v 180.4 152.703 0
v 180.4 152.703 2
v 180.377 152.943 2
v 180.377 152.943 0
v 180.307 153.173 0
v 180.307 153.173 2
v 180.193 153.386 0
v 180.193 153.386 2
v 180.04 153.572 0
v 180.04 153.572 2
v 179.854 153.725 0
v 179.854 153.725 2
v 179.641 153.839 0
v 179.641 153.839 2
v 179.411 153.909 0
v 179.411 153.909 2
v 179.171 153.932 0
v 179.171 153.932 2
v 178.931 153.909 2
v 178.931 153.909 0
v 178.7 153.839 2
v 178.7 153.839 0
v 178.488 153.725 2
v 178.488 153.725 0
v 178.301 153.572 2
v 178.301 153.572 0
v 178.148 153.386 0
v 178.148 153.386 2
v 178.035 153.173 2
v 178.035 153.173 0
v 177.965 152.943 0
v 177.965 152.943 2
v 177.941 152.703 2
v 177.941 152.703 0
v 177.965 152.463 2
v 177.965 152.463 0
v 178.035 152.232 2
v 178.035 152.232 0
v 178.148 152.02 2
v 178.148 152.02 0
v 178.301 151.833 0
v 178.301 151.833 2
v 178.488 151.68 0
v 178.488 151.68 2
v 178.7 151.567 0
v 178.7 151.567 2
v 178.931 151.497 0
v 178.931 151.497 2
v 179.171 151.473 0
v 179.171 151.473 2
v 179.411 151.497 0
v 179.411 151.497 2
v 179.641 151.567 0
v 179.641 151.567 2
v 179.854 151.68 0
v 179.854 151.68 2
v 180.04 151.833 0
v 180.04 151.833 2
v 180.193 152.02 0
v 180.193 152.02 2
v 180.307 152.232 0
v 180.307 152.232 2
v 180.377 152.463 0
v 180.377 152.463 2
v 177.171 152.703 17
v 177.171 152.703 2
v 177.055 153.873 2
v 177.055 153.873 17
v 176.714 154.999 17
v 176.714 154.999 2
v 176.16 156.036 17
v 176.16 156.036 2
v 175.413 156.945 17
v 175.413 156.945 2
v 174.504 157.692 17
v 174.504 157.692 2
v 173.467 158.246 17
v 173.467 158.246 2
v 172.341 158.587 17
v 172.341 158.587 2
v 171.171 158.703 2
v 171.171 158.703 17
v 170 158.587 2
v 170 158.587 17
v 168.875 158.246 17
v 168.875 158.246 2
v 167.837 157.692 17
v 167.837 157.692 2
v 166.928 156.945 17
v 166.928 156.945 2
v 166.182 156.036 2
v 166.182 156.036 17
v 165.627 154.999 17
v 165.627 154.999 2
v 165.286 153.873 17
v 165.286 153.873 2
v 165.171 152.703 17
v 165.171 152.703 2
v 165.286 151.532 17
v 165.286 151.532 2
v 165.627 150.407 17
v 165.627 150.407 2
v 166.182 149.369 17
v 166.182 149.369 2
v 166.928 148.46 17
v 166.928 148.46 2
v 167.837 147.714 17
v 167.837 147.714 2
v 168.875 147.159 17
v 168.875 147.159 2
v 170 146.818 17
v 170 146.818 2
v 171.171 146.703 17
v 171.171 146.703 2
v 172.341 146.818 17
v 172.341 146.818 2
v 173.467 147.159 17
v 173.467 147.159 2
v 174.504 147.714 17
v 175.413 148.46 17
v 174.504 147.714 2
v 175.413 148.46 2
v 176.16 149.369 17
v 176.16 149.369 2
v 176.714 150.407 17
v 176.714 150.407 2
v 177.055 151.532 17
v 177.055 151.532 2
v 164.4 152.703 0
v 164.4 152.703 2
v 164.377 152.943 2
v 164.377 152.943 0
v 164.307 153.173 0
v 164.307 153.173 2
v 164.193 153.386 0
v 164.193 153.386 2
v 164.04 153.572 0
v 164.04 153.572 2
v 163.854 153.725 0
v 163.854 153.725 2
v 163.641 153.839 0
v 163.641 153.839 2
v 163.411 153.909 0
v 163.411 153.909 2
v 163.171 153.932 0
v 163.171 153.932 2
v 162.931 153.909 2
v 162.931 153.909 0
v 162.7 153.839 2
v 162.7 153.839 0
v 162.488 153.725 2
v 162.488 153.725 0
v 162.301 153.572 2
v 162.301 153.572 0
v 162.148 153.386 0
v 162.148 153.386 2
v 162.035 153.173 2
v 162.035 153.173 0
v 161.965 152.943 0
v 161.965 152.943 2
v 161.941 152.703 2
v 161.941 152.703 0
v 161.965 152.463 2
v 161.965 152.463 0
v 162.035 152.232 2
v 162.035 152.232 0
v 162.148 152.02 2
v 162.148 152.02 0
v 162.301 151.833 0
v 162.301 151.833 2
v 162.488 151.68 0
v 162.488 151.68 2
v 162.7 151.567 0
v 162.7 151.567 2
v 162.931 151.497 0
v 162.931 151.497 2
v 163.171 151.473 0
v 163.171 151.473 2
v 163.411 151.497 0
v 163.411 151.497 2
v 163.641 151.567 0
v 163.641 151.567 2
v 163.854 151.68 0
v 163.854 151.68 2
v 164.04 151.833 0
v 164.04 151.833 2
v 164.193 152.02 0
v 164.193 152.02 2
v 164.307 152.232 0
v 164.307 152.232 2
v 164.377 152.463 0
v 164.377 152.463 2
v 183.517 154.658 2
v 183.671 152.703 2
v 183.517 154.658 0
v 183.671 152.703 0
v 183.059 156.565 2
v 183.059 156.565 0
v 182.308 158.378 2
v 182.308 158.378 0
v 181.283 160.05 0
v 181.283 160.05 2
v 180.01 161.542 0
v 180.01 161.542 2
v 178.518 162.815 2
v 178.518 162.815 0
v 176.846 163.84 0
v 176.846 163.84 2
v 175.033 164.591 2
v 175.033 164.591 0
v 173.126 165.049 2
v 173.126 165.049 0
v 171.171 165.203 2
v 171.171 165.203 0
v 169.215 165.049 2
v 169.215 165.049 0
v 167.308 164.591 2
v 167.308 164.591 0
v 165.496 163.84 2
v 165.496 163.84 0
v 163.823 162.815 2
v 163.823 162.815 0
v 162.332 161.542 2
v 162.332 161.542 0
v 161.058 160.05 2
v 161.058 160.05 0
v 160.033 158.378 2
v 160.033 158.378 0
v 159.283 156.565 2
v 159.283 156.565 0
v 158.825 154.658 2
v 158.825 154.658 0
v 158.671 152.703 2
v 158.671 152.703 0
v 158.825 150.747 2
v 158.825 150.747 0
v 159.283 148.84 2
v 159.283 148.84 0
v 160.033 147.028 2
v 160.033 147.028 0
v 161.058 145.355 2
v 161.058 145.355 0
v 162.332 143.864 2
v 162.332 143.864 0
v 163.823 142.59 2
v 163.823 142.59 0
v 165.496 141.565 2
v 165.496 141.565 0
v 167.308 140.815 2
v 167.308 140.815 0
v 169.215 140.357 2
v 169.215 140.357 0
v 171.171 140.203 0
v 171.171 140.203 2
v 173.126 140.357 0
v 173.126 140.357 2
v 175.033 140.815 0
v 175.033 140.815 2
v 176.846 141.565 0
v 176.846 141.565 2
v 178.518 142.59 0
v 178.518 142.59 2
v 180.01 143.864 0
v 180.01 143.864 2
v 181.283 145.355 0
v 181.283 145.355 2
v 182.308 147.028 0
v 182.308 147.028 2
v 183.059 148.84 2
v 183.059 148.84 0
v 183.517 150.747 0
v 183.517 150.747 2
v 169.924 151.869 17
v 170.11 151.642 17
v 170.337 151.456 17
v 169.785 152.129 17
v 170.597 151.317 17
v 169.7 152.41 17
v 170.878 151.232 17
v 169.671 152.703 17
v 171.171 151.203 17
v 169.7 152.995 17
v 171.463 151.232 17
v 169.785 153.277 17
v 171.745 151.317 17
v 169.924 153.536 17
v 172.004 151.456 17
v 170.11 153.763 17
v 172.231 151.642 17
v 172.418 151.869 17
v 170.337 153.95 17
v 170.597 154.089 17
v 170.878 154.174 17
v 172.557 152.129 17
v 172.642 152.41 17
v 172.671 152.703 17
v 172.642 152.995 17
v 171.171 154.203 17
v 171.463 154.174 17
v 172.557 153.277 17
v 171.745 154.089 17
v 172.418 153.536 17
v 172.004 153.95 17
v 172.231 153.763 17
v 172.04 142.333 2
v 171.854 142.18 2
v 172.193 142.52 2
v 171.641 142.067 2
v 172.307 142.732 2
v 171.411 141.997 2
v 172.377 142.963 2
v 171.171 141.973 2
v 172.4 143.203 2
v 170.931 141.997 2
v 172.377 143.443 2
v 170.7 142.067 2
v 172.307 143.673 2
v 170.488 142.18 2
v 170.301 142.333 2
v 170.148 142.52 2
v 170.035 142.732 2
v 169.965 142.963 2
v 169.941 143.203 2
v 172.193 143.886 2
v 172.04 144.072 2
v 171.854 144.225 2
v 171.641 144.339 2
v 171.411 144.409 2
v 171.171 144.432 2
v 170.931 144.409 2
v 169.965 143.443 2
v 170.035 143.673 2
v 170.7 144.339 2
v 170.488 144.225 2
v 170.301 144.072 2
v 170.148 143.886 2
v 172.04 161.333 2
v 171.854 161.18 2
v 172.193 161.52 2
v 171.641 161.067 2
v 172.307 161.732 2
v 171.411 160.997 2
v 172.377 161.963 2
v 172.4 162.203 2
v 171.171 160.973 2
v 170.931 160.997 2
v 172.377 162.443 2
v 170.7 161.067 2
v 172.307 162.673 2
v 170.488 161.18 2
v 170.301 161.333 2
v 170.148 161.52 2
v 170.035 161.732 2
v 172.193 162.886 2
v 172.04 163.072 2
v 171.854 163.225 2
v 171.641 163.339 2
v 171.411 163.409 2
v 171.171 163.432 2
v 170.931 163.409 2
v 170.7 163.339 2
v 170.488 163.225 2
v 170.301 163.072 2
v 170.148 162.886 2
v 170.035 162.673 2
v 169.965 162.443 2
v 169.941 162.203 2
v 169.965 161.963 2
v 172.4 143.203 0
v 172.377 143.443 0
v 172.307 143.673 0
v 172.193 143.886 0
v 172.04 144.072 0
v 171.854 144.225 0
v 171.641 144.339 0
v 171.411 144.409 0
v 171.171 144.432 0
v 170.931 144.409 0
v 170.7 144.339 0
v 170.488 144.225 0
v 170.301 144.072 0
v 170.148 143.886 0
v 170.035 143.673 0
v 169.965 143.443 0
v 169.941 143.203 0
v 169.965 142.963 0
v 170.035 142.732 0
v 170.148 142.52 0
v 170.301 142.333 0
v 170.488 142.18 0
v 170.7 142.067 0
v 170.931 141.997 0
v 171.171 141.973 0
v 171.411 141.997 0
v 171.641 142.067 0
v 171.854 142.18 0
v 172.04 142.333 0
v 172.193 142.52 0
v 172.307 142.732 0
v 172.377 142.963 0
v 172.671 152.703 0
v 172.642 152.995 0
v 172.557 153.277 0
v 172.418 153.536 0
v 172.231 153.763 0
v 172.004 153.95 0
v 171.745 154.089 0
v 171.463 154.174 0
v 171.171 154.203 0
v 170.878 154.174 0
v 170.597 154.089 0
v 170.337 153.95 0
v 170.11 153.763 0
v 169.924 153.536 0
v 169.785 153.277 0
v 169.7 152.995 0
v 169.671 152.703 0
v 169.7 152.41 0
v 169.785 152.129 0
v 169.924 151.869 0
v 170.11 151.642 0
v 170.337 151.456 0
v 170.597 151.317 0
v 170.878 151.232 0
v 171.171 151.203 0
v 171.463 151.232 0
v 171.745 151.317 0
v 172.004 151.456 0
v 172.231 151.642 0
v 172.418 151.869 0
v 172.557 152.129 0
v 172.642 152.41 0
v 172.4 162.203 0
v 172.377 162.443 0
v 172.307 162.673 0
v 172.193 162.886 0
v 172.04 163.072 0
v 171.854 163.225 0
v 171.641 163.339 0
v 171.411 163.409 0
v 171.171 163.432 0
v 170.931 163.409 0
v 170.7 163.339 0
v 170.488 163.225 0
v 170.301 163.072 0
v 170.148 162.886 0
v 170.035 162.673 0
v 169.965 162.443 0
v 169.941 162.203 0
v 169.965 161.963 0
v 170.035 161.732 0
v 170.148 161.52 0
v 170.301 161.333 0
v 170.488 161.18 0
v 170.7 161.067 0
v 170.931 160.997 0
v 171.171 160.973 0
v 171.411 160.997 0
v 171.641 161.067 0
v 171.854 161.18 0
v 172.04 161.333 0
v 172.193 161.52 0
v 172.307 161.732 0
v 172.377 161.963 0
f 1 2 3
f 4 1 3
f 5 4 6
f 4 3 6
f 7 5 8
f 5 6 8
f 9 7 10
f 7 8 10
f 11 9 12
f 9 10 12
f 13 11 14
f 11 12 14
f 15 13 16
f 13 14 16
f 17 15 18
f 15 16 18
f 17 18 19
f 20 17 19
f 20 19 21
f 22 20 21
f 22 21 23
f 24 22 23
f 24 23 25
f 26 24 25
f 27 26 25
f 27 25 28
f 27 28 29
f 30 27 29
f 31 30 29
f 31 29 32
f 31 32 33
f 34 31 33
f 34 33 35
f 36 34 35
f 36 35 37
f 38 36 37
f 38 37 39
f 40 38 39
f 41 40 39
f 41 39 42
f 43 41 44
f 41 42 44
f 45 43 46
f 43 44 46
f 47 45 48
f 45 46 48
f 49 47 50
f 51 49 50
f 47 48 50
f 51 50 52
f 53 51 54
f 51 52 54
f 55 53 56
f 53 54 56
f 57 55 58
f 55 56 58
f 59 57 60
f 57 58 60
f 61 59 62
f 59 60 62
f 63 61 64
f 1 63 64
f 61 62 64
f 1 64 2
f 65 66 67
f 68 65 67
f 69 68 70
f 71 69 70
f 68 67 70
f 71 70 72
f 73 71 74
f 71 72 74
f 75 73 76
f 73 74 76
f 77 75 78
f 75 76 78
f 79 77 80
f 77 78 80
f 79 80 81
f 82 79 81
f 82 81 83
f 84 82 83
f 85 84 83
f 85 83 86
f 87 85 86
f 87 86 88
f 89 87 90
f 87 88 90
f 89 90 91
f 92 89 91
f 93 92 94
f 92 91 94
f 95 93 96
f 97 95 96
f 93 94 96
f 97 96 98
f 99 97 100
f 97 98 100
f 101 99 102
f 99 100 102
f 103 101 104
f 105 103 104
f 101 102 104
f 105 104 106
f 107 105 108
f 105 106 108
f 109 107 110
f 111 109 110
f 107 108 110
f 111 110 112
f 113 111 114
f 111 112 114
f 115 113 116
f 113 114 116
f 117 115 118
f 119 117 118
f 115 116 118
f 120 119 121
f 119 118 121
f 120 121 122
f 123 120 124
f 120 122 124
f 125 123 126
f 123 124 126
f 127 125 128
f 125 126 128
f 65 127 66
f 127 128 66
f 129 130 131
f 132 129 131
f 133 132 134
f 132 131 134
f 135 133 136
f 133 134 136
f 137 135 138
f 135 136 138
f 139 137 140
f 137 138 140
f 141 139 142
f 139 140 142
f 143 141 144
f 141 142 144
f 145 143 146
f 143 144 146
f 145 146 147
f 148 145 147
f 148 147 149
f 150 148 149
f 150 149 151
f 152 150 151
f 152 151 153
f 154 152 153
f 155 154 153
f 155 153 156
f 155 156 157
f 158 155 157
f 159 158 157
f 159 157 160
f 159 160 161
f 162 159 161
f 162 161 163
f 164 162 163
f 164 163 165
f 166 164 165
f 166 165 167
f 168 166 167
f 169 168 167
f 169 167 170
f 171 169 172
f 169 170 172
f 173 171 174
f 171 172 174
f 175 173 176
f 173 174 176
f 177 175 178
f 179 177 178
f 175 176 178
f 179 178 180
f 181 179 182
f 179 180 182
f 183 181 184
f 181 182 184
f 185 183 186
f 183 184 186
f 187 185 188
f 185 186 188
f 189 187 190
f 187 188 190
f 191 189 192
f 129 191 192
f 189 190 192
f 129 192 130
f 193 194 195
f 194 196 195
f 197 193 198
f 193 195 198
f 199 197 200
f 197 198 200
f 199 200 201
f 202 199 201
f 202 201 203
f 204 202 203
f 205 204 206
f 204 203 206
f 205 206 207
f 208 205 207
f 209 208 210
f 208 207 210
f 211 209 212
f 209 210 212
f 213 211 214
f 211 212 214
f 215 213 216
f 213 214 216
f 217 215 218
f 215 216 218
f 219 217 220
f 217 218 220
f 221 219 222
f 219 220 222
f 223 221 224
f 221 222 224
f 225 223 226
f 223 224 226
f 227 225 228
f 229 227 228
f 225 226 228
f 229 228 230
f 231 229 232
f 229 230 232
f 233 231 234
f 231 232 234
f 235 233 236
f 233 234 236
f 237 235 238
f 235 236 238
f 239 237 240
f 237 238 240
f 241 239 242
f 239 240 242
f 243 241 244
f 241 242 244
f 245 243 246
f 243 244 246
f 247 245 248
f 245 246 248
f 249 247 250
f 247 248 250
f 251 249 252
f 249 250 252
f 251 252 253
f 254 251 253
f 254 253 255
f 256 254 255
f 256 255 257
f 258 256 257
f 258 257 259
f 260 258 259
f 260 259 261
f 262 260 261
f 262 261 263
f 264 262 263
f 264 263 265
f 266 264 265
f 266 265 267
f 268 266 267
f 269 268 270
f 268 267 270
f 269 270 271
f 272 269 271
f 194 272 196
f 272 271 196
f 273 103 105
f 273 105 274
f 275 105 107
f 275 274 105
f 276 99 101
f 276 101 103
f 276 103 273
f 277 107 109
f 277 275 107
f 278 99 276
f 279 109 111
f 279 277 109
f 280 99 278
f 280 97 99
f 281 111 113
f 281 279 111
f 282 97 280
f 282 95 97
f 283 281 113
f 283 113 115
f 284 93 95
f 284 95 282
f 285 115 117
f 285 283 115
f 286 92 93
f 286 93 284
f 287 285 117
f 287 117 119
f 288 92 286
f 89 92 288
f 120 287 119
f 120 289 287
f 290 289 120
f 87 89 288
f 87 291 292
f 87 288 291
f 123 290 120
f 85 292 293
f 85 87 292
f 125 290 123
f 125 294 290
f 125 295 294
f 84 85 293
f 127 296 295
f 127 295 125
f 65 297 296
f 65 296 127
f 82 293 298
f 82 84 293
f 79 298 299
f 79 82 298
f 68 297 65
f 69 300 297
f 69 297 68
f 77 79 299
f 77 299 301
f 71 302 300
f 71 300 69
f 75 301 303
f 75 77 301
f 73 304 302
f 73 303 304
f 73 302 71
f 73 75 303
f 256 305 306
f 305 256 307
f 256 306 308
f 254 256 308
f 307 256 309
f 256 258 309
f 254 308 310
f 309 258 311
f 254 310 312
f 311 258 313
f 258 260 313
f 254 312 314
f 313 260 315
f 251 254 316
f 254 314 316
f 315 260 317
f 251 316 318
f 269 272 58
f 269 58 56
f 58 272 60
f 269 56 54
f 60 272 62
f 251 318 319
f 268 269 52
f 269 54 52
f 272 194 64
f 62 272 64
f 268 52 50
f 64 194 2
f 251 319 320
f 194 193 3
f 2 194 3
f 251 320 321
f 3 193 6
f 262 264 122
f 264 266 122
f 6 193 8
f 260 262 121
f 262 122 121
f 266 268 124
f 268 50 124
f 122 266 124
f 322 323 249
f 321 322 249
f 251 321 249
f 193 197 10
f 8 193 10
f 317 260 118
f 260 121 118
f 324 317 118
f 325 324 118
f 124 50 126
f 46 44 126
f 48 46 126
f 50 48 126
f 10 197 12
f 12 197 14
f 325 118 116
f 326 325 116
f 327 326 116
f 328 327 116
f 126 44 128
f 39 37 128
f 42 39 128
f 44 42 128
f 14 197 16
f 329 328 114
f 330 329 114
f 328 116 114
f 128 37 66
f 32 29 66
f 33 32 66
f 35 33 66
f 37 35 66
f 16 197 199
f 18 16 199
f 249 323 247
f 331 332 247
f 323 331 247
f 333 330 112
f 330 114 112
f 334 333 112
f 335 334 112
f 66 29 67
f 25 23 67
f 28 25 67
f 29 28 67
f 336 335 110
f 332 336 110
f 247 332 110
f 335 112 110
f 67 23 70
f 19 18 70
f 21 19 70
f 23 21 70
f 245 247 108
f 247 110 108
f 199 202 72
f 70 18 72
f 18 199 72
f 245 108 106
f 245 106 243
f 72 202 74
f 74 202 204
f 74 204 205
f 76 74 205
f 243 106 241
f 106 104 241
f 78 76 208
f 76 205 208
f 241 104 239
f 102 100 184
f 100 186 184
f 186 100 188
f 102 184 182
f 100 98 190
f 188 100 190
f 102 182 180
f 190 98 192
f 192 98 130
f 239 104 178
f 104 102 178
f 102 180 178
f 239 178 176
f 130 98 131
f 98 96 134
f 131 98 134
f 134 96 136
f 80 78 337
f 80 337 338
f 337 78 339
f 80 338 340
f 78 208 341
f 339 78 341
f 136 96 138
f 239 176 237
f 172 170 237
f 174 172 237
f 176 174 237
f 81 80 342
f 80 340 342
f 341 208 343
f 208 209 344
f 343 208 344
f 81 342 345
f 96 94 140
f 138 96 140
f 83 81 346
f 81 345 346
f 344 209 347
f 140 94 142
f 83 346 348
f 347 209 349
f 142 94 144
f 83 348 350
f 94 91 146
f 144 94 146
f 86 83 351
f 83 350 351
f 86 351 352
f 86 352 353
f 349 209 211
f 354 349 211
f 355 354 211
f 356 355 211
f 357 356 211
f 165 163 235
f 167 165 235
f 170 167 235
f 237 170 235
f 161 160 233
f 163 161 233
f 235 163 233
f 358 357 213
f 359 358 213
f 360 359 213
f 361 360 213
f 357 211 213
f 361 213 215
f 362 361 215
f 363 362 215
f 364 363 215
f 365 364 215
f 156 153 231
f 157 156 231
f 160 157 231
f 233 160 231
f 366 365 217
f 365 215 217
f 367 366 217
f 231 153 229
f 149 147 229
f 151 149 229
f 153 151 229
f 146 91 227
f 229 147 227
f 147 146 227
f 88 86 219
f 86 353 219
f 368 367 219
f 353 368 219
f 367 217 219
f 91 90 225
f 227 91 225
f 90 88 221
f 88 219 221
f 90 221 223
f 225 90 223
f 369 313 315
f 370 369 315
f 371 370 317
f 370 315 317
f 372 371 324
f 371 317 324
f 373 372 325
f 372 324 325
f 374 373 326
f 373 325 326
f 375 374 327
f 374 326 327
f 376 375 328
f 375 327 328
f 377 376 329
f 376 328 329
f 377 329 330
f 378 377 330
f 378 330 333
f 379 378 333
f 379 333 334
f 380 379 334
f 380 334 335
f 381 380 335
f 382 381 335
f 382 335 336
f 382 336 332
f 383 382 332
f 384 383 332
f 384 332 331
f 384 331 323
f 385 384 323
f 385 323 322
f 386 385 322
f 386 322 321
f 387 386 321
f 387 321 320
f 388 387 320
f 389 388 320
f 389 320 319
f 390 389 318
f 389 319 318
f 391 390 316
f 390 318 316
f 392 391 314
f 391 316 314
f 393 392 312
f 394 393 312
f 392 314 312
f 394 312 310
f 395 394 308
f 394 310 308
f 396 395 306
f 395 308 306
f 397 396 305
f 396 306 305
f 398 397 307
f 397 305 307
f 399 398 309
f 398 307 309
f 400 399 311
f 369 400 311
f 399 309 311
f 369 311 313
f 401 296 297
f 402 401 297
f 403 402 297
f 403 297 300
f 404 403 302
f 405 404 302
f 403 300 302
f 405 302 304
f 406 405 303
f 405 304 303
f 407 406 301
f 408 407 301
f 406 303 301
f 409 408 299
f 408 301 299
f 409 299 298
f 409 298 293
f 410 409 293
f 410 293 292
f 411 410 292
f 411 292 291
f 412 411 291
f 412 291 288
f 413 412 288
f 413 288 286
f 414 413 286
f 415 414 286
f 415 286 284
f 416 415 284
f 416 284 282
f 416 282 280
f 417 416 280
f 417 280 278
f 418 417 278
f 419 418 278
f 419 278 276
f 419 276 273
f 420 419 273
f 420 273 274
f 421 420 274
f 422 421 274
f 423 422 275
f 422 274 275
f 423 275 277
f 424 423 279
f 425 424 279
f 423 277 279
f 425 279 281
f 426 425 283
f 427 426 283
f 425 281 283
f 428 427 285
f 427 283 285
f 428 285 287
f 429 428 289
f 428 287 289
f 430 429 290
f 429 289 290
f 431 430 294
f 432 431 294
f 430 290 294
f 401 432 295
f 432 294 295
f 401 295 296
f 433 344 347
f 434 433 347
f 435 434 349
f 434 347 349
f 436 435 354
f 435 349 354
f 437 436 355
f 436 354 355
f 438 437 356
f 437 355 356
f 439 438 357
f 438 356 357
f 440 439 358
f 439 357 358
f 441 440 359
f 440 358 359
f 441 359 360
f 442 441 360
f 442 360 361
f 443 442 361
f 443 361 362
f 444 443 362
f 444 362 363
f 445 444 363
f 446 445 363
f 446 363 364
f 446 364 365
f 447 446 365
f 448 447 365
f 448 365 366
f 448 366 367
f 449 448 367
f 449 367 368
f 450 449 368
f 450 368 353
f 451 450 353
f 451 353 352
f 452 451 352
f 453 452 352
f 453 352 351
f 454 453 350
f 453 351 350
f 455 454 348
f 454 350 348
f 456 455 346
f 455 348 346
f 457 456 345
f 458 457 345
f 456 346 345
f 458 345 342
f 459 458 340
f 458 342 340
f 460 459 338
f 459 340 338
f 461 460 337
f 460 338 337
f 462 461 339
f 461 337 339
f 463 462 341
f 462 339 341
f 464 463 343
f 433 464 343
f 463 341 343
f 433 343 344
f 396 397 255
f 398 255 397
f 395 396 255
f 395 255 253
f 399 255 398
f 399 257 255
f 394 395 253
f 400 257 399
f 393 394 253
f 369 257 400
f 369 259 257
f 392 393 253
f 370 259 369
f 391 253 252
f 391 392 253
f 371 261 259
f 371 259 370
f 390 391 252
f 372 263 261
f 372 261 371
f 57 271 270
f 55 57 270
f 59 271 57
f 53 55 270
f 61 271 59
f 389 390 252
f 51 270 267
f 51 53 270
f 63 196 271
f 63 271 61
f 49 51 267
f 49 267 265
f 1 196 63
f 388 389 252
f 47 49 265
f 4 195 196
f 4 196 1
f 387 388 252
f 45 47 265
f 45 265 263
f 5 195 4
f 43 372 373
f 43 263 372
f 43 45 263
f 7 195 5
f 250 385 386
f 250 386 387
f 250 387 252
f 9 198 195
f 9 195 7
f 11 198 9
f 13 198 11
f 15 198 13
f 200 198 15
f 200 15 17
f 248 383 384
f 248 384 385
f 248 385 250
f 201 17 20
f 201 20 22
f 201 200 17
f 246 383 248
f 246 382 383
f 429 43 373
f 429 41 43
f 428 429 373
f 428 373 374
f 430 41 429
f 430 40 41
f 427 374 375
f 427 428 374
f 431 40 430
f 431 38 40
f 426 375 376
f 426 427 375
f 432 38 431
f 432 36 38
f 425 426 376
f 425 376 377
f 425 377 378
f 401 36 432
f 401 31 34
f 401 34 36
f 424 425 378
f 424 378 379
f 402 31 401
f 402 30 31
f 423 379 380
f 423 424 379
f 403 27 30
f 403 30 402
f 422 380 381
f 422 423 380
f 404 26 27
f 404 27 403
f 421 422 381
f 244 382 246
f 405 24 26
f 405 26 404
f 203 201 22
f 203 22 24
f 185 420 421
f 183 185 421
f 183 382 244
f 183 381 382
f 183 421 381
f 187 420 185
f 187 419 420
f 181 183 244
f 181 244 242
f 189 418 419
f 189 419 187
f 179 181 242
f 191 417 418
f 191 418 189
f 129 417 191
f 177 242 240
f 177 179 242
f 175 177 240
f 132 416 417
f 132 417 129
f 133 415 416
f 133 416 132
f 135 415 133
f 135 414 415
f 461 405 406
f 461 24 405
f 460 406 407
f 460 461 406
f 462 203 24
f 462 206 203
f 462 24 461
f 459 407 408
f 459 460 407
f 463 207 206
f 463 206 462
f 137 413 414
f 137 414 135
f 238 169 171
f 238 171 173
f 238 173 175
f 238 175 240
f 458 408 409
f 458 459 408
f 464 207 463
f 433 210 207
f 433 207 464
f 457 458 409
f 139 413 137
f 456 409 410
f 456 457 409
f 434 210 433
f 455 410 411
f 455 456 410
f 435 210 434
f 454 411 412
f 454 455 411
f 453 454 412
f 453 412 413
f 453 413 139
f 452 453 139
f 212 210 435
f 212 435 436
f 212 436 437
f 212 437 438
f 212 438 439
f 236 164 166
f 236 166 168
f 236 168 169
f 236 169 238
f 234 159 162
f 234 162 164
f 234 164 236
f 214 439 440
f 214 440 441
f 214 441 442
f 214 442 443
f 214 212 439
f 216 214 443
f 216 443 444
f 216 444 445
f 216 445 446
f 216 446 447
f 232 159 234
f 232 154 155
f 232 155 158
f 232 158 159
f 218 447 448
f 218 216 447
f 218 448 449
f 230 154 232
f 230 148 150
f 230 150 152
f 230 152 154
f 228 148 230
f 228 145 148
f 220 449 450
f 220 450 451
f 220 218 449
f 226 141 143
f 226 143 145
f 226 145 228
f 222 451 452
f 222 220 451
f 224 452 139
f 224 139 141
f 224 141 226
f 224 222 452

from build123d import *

# Parameters (mm, degrees)
ESQUISSE1_W                   = 12.5
ESQUISSE1_H                   = 2
ESQUISSE2_R                   = 6
BOSS_EXTRU_1_DEPTH            = 15
DIAM_TRE_DU_PER_AGE_3_0_3_1_D = 3
D_GAGEMENT_M21_D              = 2.459
D_GAGEMENT_M21_DEPTH          = 17


with BuildPart() as part:
    # Esquisse1 → Révolution1 (revolve)
    with BuildSketch(Plane(origin=(0, 152.70275651, 0), x_dir=(1, 0, 0), z_dir=(0, 1, 0))):
        with Locations((177.420752313, -1)):
            Rectangle(ESQUISSE1_W, ESQUISSE1_H)
    revolve(axis=Axis((171.170752313, 152.70275651, 0), (0, 0, 1)))

    # Esquisse2 → Boss.-Extru.1 (add)
    with BuildSketch(Plane.XY.offset(2)):
        with Locations((171.170752313, 152.70275651)):
            Circle(ESQUISSE2_R)
    extrude(amount=BOSS_EXTRU_1_DEPTH)

    # Diamètre du perçage Ø3.0 (3)1 (through all)
    with Locations(Plane(origin=(0, 0, 0), x_dir=(-1, 0, 0), z_dir=(0, 0, -1))):
        with Locations((-171.170752313, 152.70275651)):
            Hole(DIAM_TRE_DU_PER_AGE_3_0_3_1_D / 2)

    # Dégagement M21
    with Locations(Plane(origin=(0, 0, 0), x_dir=(-1, 0, 0), z_dir=(0, 0, -1))):
        with Locations((-179.170752313, 152.70275651), (-163.170752313, 152.70275651), (-171.170752313, 162.20275651), (-171.170752313, 143.20275651)):
            Hole(D_GAGEMENT_M21_D / 2, depth=D_GAGEMENT_M21_DEPTH)


solid = part.part
